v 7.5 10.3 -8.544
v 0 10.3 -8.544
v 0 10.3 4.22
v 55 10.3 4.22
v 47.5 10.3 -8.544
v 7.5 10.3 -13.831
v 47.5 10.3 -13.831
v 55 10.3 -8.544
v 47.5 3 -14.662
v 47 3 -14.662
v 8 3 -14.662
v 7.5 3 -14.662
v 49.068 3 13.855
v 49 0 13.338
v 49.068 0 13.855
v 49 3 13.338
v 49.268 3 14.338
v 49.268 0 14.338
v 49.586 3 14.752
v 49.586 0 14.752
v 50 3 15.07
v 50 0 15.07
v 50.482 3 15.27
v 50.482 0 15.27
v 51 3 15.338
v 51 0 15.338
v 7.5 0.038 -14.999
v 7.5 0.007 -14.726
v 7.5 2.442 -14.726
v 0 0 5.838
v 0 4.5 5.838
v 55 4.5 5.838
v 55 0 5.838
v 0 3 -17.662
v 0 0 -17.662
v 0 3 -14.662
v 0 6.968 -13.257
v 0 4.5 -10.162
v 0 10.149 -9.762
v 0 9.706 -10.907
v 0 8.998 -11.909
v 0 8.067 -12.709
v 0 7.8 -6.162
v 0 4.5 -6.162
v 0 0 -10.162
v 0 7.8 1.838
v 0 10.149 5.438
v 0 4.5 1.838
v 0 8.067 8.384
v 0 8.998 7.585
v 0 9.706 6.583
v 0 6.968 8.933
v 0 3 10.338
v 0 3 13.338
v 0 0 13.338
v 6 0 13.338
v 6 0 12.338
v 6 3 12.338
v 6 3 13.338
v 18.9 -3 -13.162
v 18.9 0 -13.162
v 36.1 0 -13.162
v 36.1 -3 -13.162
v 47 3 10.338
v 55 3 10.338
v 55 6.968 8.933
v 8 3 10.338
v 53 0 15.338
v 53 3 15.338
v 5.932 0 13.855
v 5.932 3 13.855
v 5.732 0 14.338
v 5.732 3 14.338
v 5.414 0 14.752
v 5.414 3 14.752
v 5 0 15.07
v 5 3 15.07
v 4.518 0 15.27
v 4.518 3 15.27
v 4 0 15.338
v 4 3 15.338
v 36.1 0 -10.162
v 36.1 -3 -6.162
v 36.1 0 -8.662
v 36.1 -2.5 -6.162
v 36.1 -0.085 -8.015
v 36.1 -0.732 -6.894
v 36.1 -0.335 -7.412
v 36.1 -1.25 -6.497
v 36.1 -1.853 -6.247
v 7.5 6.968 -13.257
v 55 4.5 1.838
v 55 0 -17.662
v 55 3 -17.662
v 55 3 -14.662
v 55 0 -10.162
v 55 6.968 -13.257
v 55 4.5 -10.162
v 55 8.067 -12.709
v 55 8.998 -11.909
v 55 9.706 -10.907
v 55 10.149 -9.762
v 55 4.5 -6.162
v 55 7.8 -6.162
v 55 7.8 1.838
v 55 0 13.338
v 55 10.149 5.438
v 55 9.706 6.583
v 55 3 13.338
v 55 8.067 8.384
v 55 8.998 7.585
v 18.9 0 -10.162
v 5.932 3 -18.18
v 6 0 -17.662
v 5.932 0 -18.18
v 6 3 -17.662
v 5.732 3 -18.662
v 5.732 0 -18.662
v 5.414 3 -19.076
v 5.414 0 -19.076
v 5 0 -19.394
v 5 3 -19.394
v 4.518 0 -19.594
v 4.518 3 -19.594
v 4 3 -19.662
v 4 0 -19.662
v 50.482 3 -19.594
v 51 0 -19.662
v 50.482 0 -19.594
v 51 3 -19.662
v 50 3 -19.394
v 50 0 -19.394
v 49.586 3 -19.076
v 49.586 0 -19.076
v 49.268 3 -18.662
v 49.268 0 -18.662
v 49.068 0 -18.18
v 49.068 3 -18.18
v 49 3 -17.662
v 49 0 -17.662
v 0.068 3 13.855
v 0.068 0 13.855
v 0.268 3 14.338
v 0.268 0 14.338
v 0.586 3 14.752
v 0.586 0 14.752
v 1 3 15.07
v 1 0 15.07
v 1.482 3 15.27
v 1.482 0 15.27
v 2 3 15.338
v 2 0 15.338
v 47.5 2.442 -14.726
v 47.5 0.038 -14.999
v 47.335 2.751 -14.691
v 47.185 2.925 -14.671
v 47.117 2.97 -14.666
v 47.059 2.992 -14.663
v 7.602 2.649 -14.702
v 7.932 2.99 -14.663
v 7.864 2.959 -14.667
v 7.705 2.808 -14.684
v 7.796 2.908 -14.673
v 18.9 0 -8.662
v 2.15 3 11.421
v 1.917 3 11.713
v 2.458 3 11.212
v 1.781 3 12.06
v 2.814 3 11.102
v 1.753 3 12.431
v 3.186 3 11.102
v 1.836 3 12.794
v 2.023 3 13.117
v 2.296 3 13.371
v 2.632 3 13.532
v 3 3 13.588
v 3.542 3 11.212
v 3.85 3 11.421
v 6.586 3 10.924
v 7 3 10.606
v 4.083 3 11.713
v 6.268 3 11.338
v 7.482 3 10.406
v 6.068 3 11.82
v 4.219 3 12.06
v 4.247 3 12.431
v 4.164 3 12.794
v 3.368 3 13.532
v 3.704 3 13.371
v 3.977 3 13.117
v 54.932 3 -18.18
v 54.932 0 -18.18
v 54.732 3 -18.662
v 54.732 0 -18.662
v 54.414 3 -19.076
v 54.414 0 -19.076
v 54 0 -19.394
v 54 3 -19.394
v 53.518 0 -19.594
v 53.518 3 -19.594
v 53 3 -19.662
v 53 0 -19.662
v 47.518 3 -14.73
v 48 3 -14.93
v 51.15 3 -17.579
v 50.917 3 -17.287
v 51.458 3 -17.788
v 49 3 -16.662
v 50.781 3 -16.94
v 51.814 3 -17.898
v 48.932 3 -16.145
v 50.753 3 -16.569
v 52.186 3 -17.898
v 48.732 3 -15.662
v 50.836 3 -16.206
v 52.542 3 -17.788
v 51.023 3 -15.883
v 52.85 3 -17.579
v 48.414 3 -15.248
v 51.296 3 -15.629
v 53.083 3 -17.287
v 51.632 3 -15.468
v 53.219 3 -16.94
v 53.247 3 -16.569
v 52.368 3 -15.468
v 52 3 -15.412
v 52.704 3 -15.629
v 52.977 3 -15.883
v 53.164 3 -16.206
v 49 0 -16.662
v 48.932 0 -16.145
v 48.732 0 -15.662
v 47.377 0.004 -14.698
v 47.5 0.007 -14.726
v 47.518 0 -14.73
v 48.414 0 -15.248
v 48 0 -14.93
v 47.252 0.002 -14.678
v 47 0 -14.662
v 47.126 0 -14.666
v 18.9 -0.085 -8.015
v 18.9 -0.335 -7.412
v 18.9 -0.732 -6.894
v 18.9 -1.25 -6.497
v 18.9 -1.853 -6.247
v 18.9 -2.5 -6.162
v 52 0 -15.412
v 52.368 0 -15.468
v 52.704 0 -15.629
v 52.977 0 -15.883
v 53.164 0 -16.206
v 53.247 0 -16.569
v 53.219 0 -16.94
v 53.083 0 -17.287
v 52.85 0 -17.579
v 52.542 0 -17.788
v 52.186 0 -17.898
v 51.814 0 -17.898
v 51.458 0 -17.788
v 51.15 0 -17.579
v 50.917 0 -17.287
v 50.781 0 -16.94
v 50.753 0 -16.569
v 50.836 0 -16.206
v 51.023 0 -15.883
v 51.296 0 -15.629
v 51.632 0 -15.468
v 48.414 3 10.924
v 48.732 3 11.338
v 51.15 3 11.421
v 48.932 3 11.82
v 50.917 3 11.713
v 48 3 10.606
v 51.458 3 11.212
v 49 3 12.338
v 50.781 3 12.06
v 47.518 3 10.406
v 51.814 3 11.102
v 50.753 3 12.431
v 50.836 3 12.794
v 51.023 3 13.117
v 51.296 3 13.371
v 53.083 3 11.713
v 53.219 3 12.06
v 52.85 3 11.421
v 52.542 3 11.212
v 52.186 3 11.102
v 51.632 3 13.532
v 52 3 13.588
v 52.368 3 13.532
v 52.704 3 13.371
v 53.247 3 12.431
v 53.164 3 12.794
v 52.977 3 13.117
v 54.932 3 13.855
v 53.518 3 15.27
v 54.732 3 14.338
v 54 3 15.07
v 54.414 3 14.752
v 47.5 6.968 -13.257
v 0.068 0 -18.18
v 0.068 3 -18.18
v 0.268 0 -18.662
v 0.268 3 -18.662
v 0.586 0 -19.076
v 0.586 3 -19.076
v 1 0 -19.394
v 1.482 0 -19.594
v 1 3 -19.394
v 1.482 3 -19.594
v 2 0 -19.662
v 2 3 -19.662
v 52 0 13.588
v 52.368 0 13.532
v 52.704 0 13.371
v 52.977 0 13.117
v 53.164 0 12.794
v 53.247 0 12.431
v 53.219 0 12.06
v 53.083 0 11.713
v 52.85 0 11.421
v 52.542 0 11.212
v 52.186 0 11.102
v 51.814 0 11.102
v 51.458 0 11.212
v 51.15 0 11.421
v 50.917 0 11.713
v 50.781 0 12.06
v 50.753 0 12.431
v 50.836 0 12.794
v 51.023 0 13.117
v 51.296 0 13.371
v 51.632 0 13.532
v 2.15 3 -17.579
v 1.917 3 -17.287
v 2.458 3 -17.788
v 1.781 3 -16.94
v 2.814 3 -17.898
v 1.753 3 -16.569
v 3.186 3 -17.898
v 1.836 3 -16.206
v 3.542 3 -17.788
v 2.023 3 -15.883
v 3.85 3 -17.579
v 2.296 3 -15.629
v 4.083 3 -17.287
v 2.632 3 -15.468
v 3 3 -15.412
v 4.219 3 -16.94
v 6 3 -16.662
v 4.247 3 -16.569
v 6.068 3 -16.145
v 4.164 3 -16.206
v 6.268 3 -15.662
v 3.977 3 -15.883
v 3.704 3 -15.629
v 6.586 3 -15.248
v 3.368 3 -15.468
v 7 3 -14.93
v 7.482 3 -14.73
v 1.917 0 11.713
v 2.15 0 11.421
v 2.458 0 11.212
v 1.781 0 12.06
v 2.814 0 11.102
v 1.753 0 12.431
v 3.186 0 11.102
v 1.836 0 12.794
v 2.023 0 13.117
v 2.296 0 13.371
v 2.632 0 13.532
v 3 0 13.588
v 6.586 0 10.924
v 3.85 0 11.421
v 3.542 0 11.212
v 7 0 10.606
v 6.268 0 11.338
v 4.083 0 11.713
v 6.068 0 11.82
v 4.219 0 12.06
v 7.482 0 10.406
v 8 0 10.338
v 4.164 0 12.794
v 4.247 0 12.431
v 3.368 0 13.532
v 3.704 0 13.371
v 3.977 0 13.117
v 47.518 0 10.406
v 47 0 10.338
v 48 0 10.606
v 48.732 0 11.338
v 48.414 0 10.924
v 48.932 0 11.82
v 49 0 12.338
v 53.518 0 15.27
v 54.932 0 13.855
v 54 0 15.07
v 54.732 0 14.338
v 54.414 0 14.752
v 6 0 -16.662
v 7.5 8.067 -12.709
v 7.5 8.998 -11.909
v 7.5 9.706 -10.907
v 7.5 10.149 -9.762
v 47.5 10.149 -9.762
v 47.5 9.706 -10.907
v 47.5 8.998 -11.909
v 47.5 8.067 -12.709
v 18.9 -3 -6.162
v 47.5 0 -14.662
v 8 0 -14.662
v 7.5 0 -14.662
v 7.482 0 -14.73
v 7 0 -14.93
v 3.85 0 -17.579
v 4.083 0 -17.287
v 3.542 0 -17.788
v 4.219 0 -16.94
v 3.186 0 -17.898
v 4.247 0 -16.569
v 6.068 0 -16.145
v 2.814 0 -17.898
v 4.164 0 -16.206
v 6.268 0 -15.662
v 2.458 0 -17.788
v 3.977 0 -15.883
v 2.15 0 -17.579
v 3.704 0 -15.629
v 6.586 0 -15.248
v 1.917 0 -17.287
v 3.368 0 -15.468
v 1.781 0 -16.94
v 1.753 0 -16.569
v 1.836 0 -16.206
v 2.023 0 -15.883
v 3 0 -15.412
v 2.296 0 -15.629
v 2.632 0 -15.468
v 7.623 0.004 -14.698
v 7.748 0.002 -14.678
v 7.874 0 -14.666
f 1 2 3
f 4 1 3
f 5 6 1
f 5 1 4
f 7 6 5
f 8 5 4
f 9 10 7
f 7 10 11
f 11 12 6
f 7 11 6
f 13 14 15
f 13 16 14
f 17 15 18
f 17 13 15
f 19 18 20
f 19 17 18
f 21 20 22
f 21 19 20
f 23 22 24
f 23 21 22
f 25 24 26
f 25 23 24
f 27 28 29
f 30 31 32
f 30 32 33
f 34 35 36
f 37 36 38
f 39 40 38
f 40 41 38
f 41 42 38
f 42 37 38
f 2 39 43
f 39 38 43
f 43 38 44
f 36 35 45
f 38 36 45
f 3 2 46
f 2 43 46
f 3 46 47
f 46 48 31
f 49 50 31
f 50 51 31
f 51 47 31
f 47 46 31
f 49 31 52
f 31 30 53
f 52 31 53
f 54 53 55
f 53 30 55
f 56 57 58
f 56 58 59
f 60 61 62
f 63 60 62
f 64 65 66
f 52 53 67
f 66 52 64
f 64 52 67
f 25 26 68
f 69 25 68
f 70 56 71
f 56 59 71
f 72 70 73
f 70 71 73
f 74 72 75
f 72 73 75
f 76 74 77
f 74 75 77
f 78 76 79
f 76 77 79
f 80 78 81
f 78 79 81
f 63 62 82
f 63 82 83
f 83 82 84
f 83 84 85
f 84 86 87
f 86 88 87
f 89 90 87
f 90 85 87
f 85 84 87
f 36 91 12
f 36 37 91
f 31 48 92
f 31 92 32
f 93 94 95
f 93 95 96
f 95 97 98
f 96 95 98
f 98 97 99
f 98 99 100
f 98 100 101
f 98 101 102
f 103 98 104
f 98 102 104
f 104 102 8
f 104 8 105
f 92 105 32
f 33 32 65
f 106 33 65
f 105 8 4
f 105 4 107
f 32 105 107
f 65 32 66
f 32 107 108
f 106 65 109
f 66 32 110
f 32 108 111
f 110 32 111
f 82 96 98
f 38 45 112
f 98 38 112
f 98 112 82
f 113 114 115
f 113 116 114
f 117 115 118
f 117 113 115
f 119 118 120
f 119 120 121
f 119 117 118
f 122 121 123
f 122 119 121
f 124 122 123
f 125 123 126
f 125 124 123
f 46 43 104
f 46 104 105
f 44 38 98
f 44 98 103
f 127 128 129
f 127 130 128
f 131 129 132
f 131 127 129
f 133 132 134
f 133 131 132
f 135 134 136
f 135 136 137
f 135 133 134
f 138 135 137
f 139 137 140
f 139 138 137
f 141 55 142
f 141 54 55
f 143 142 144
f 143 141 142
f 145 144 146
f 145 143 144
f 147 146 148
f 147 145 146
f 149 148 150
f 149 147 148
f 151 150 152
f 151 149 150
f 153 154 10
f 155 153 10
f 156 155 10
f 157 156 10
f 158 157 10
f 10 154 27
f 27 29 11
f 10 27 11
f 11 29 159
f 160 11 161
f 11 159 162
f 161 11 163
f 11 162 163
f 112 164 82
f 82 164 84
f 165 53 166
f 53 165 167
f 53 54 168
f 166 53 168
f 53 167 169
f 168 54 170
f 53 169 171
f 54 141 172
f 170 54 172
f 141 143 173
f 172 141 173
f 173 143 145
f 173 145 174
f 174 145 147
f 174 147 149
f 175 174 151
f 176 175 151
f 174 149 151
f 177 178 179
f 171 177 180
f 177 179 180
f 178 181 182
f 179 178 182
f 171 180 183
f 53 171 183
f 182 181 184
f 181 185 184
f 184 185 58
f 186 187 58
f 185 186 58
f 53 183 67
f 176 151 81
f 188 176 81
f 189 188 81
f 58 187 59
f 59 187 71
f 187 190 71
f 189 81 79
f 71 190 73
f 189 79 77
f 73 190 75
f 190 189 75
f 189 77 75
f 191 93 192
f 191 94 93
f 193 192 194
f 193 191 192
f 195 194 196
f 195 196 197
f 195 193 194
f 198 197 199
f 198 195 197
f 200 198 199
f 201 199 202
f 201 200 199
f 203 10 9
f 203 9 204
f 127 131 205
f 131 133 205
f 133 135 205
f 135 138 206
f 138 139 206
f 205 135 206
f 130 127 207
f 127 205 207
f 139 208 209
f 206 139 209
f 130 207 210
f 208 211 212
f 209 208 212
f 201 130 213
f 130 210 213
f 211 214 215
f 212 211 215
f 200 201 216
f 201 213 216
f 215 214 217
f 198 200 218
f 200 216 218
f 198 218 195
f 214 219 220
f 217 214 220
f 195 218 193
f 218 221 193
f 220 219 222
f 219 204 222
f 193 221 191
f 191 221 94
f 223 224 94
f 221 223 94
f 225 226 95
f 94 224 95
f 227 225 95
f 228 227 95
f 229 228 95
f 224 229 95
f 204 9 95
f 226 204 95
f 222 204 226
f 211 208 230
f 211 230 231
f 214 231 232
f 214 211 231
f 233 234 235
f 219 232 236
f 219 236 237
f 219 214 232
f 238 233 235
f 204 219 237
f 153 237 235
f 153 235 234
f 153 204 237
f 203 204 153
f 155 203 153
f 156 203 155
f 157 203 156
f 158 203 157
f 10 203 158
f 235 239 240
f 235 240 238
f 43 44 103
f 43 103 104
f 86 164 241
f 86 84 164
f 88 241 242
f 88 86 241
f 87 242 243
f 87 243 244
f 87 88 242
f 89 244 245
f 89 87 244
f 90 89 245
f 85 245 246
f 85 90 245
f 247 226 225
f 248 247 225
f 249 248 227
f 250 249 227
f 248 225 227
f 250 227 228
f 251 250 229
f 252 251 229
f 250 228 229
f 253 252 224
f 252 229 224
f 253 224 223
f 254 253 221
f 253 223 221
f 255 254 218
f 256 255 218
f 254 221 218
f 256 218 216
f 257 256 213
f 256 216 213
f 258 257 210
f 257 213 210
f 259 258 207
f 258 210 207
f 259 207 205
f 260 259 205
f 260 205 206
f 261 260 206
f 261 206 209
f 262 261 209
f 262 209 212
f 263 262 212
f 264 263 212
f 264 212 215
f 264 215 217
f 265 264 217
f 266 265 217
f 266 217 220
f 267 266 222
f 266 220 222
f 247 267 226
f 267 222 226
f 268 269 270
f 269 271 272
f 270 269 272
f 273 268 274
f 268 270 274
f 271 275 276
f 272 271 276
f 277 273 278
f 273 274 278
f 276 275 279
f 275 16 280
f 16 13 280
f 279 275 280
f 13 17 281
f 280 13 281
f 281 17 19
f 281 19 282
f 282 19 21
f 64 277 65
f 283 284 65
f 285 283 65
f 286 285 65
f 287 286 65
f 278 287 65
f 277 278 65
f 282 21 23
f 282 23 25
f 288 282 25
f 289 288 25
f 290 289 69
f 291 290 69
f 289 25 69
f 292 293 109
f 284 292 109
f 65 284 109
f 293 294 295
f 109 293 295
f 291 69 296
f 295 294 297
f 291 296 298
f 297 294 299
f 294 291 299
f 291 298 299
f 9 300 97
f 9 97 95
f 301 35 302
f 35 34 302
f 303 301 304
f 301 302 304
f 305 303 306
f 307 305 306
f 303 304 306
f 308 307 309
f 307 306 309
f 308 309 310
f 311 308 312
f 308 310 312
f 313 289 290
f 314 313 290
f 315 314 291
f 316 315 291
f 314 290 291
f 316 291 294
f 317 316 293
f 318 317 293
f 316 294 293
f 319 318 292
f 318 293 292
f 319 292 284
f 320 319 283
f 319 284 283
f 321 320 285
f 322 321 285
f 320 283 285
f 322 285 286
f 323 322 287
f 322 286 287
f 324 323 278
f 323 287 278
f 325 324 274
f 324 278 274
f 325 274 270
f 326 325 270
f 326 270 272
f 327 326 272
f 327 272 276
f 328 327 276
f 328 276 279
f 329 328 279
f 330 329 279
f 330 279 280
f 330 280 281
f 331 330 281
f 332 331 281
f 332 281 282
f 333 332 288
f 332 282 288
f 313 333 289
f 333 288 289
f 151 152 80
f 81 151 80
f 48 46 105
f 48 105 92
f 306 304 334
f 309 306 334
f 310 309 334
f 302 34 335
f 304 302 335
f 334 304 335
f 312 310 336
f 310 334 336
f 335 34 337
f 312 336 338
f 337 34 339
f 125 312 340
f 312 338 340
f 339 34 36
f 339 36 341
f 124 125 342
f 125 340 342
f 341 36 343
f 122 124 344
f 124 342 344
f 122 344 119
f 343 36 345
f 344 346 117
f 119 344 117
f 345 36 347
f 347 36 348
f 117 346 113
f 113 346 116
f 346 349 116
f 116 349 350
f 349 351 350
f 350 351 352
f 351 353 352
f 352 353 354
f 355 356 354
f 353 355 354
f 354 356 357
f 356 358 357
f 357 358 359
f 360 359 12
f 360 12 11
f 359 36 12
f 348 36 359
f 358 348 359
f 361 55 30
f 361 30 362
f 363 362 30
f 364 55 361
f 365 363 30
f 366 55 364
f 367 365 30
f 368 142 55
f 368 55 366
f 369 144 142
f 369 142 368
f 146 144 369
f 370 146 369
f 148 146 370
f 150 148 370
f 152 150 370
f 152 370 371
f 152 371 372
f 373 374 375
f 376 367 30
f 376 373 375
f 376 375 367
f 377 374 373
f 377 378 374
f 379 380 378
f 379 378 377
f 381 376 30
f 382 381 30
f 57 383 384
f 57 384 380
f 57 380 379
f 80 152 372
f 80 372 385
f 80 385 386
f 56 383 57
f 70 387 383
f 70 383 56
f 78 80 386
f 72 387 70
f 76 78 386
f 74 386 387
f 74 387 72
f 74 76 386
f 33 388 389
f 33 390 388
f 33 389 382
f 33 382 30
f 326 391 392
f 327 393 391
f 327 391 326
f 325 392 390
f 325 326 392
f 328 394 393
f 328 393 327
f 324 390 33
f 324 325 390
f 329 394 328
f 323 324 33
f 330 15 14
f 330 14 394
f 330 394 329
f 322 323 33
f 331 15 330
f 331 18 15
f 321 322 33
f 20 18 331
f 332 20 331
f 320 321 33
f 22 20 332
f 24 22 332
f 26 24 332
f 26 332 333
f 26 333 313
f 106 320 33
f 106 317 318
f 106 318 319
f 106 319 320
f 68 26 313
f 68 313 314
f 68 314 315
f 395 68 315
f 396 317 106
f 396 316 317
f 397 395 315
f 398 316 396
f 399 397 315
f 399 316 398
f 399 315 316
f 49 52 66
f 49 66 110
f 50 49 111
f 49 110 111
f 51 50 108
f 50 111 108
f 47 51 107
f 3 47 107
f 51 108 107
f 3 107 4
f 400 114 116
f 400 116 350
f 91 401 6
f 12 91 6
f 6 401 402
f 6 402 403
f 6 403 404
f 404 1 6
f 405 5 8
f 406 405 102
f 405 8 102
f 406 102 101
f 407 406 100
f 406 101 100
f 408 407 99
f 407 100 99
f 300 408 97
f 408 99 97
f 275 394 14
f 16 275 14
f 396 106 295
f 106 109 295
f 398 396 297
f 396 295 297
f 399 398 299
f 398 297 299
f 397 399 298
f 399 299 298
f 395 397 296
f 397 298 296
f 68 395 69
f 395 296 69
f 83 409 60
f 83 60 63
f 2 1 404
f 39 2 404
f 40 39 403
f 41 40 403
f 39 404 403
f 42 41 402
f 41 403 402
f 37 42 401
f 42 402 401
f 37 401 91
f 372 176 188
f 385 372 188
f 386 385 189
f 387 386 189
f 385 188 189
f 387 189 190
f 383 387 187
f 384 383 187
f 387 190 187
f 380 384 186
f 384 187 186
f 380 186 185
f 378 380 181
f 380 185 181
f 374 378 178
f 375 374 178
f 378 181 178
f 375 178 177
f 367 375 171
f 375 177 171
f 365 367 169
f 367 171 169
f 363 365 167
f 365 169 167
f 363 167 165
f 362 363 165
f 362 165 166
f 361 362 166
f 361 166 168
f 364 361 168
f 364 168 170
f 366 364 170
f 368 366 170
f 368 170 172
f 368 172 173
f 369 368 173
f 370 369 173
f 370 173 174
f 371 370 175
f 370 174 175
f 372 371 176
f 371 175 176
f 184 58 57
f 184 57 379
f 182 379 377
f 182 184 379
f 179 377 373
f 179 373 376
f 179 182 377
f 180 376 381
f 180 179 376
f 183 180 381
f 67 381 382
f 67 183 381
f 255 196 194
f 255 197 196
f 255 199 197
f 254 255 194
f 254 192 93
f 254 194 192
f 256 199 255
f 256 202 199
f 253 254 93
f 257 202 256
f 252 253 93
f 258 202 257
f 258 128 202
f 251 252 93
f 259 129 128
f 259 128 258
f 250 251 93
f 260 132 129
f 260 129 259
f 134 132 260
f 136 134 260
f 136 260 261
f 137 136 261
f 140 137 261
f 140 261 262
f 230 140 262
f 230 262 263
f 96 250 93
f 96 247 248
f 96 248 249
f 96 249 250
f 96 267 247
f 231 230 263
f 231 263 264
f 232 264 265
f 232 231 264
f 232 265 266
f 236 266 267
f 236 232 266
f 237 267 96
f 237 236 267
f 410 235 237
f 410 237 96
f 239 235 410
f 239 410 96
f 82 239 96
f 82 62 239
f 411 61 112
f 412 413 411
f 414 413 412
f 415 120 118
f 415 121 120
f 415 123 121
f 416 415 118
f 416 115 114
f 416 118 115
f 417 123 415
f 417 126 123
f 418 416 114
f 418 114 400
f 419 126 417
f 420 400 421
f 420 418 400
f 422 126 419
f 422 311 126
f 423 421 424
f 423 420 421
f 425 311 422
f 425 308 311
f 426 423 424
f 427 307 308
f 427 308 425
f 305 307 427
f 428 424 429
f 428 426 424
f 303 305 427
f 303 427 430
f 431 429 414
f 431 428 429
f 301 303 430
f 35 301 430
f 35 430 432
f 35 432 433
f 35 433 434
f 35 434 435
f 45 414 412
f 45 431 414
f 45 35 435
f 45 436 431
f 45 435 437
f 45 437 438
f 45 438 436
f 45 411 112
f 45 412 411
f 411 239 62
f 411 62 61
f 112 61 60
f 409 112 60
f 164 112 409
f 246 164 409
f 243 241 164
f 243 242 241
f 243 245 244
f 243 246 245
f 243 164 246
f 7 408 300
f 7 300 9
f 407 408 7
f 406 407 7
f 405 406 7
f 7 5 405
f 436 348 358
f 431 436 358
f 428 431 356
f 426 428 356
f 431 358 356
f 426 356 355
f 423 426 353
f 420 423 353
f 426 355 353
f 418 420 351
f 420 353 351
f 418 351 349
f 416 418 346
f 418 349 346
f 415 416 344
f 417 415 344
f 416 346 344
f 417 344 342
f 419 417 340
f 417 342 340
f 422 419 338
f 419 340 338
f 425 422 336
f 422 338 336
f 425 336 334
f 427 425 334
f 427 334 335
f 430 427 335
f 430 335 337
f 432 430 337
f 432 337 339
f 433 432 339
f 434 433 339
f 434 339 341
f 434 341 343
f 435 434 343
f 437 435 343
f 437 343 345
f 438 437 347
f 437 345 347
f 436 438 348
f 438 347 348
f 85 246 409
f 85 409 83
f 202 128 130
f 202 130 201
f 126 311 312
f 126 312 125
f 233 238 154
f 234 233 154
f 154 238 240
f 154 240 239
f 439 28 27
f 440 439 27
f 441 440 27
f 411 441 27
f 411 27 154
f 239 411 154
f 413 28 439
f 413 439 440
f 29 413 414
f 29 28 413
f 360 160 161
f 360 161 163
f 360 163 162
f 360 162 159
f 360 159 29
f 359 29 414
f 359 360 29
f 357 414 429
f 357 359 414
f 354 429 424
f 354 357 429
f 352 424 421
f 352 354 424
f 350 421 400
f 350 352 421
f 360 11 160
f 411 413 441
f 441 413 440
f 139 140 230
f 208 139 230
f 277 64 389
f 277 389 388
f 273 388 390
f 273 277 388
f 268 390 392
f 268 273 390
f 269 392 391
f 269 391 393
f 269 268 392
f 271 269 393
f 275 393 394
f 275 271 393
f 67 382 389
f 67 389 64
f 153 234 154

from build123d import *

# Parameters (mm, degrees)
BOSS_EXTRUDE1_DEPTH = 55
FILLET2_R           = 5
SKETCH2_W           = 6
SKETCH2_H           = 5
BOSS_EXTRUDE2_DEPTH = 3
FILLET3_R           = 2
SKETCH3_R           = 1.25
CUT_EXTRUDE1_DEPTH  = 3
SKETCH5_W           = 17.2
SKETCH5_H           = 7
BOSS_EXTRUDE4_DEPTH = 3
BOSS_EXTRUDE5_START = 7.5
BOSS_EXTRUDE5_DEPTH = 40
SKETCH7_W           = 63.002691758
SKETCH7_H           = 45.786839941
CUT_EXTRUDE2_DEPTH  = 10
FILLET5_R           = 2.5


# Read off the part's stored shape, not the designer's step: Boss-Extrude5
with BuildPart() as part:
    # Sketch1 → Boss-Extrude1 (new body)
    with BuildSketch(Plane(origin=(0, 0, 0), x_dir=(0, 0, -1), z_dir=(1, 0, 0))):
        Polygon((10.162208757, 0), (10.162208757, 4.5), (6.162208757, 4.5), (6.162208757, 7.8), (-1.837791243, 7.8), (-1.837791243, 4.5), (-5.837791243, 4.5), (-5.837791243, 0), (-10.337791243, 0), (-10.337791243, 3), (-7.753679525, 10.3), (12.078097038, 10.3), (14.662208757, 3), (14.662208757, 0), align=None)
    extrude(amount=BOSS_EXTRUDE1_DEPTH)

    # Fillet2
    fillet2_edges = [part.edges().sort_by_distance(p)[0] for p in [
        (27.5, 10.3, 7.753679525),
        (27.5, 10.3, -12.078097038),
    ]]
    fillet(fillet2_edges, radius=FILLET2_R)

    # Sketch2 → Boss-Extrude2 (add)
    with BuildSketch(Plane.XZ):
        with Locations((3, 12.837791243)):
            Rectangle(SKETCH2_W, SKETCH2_H)
        with Locations((52, 12.837791243)):
            Rectangle(SKETCH2_W, SKETCH2_H)
        with Locations((52, -17.162208757)):
            Rectangle(SKETCH2_W, SKETCH2_H)
        with Locations((3, -17.162208757)):
            Rectangle(SKETCH2_W, SKETCH2_H)
    extrude(amount=-BOSS_EXTRUDE2_DEPTH)

    # Fillet3
    fillet3_edges = [part.edges().sort_by_distance(p)[0] for p in [
        (0, 1.5, 15.337791243),
        (6, 1.5, 15.337791243),
        (6, 1.5, 10.337791243),
        (55, 1.5, 15.337791243),
        (49, 1.5, 10.337791243),
        (49, 1.5, 15.337791243),
        (55, 1.5, -19.662208757),
        (49, 1.5, -19.662208757),
        (49, 1.5, -14.662208757),
        (0, 1.5, -19.662208757),
        (6, 1.5, -14.662208757),
        (6, 1.5, -19.662208757),
    ]]
    fillet(fillet3_edges, radius=FILLET3_R)

    # Sketch3 → Cut-Extrude1 (cut)
    with BuildSketch(Plane(origin=(0, 3, 0), x_dir=(1, 0, 0), z_dir=(0, 1, 0))):
        with Locations(Location((3, -12.337791243, 0), (0, 0, 270))):
            Circle(SKETCH3_R)
        with Locations(Location((3, 16.662208757, 0), (0, 0, 270))):
            Circle(SKETCH3_R)
        with Locations(Location((52, 16.662208757, 0), (0, 0, 270))):
            Circle(SKETCH3_R)
        with Locations(Location((52, -12.337791243, 0), (0, 0, 270))):
            Circle(SKETCH3_R)
    extrude(amount=-CUT_EXTRUDE1_DEPTH, mode=Mode.SUBTRACT)

    # Sketch5 → Boss-Extrude4 (add)
    with BuildSketch(Plane.XZ):
        with Locations((27.5, -9.662208757)):
            Rectangle(SKETCH5_W, SKETCH5_H)
    extrude(amount=BOSS_EXTRUDE4_DEPTH)

    # Boss-Extrude5 outline → Boss-Extrude5 (add)
    with BuildSketch(Plane.YZ.offset(BOSS_EXTRUDE5_START)):
        with BuildLine():
            Line((6.96848703, -13.257412341), (3, -14.662208757))
            Line((3, -14.662208757), (11.563888282, -13.687484192))
            Line((11.563888282, -13.687484192), (10.3, -2.583015869))
            Line((10.3, -2.583015869), (10.3, -8.544011124))
            ThreePointArc((10.3, -8.544011124), (9.383040237, -11.429974122), (6.96848703, -13.257412341))
        make_face()
        Polygon((0, -14.662208757), (0.038366584, -14.999295924), (3, -14.662208757), align=None)
    extrude(amount=BOSS_EXTRUDE5_DEPTH)

    # Sketch7 → Cut-Extrude2 (cut)
    with BuildSketch(Plane(origin=(0, 10.3, 0), x_dir=(1, 0, 0), z_dir=(0, 1, 0))):
        with Locations((26.50814736, 1.093849158)):
            Rectangle(SKETCH7_W, SKETCH7_H)
    extrude(amount=CUT_EXTRUDE2_DEPTH, mode=Mode.SUBTRACT)

    # Fillet5
    fillet5_edges = [part.edges().sort_by_distance(p)[0] for p in [
        (27.5, 0, -6.162208757),
    ]]
    fillet(fillet5_edges, radius=FILLET5_R)


solid = part.part
